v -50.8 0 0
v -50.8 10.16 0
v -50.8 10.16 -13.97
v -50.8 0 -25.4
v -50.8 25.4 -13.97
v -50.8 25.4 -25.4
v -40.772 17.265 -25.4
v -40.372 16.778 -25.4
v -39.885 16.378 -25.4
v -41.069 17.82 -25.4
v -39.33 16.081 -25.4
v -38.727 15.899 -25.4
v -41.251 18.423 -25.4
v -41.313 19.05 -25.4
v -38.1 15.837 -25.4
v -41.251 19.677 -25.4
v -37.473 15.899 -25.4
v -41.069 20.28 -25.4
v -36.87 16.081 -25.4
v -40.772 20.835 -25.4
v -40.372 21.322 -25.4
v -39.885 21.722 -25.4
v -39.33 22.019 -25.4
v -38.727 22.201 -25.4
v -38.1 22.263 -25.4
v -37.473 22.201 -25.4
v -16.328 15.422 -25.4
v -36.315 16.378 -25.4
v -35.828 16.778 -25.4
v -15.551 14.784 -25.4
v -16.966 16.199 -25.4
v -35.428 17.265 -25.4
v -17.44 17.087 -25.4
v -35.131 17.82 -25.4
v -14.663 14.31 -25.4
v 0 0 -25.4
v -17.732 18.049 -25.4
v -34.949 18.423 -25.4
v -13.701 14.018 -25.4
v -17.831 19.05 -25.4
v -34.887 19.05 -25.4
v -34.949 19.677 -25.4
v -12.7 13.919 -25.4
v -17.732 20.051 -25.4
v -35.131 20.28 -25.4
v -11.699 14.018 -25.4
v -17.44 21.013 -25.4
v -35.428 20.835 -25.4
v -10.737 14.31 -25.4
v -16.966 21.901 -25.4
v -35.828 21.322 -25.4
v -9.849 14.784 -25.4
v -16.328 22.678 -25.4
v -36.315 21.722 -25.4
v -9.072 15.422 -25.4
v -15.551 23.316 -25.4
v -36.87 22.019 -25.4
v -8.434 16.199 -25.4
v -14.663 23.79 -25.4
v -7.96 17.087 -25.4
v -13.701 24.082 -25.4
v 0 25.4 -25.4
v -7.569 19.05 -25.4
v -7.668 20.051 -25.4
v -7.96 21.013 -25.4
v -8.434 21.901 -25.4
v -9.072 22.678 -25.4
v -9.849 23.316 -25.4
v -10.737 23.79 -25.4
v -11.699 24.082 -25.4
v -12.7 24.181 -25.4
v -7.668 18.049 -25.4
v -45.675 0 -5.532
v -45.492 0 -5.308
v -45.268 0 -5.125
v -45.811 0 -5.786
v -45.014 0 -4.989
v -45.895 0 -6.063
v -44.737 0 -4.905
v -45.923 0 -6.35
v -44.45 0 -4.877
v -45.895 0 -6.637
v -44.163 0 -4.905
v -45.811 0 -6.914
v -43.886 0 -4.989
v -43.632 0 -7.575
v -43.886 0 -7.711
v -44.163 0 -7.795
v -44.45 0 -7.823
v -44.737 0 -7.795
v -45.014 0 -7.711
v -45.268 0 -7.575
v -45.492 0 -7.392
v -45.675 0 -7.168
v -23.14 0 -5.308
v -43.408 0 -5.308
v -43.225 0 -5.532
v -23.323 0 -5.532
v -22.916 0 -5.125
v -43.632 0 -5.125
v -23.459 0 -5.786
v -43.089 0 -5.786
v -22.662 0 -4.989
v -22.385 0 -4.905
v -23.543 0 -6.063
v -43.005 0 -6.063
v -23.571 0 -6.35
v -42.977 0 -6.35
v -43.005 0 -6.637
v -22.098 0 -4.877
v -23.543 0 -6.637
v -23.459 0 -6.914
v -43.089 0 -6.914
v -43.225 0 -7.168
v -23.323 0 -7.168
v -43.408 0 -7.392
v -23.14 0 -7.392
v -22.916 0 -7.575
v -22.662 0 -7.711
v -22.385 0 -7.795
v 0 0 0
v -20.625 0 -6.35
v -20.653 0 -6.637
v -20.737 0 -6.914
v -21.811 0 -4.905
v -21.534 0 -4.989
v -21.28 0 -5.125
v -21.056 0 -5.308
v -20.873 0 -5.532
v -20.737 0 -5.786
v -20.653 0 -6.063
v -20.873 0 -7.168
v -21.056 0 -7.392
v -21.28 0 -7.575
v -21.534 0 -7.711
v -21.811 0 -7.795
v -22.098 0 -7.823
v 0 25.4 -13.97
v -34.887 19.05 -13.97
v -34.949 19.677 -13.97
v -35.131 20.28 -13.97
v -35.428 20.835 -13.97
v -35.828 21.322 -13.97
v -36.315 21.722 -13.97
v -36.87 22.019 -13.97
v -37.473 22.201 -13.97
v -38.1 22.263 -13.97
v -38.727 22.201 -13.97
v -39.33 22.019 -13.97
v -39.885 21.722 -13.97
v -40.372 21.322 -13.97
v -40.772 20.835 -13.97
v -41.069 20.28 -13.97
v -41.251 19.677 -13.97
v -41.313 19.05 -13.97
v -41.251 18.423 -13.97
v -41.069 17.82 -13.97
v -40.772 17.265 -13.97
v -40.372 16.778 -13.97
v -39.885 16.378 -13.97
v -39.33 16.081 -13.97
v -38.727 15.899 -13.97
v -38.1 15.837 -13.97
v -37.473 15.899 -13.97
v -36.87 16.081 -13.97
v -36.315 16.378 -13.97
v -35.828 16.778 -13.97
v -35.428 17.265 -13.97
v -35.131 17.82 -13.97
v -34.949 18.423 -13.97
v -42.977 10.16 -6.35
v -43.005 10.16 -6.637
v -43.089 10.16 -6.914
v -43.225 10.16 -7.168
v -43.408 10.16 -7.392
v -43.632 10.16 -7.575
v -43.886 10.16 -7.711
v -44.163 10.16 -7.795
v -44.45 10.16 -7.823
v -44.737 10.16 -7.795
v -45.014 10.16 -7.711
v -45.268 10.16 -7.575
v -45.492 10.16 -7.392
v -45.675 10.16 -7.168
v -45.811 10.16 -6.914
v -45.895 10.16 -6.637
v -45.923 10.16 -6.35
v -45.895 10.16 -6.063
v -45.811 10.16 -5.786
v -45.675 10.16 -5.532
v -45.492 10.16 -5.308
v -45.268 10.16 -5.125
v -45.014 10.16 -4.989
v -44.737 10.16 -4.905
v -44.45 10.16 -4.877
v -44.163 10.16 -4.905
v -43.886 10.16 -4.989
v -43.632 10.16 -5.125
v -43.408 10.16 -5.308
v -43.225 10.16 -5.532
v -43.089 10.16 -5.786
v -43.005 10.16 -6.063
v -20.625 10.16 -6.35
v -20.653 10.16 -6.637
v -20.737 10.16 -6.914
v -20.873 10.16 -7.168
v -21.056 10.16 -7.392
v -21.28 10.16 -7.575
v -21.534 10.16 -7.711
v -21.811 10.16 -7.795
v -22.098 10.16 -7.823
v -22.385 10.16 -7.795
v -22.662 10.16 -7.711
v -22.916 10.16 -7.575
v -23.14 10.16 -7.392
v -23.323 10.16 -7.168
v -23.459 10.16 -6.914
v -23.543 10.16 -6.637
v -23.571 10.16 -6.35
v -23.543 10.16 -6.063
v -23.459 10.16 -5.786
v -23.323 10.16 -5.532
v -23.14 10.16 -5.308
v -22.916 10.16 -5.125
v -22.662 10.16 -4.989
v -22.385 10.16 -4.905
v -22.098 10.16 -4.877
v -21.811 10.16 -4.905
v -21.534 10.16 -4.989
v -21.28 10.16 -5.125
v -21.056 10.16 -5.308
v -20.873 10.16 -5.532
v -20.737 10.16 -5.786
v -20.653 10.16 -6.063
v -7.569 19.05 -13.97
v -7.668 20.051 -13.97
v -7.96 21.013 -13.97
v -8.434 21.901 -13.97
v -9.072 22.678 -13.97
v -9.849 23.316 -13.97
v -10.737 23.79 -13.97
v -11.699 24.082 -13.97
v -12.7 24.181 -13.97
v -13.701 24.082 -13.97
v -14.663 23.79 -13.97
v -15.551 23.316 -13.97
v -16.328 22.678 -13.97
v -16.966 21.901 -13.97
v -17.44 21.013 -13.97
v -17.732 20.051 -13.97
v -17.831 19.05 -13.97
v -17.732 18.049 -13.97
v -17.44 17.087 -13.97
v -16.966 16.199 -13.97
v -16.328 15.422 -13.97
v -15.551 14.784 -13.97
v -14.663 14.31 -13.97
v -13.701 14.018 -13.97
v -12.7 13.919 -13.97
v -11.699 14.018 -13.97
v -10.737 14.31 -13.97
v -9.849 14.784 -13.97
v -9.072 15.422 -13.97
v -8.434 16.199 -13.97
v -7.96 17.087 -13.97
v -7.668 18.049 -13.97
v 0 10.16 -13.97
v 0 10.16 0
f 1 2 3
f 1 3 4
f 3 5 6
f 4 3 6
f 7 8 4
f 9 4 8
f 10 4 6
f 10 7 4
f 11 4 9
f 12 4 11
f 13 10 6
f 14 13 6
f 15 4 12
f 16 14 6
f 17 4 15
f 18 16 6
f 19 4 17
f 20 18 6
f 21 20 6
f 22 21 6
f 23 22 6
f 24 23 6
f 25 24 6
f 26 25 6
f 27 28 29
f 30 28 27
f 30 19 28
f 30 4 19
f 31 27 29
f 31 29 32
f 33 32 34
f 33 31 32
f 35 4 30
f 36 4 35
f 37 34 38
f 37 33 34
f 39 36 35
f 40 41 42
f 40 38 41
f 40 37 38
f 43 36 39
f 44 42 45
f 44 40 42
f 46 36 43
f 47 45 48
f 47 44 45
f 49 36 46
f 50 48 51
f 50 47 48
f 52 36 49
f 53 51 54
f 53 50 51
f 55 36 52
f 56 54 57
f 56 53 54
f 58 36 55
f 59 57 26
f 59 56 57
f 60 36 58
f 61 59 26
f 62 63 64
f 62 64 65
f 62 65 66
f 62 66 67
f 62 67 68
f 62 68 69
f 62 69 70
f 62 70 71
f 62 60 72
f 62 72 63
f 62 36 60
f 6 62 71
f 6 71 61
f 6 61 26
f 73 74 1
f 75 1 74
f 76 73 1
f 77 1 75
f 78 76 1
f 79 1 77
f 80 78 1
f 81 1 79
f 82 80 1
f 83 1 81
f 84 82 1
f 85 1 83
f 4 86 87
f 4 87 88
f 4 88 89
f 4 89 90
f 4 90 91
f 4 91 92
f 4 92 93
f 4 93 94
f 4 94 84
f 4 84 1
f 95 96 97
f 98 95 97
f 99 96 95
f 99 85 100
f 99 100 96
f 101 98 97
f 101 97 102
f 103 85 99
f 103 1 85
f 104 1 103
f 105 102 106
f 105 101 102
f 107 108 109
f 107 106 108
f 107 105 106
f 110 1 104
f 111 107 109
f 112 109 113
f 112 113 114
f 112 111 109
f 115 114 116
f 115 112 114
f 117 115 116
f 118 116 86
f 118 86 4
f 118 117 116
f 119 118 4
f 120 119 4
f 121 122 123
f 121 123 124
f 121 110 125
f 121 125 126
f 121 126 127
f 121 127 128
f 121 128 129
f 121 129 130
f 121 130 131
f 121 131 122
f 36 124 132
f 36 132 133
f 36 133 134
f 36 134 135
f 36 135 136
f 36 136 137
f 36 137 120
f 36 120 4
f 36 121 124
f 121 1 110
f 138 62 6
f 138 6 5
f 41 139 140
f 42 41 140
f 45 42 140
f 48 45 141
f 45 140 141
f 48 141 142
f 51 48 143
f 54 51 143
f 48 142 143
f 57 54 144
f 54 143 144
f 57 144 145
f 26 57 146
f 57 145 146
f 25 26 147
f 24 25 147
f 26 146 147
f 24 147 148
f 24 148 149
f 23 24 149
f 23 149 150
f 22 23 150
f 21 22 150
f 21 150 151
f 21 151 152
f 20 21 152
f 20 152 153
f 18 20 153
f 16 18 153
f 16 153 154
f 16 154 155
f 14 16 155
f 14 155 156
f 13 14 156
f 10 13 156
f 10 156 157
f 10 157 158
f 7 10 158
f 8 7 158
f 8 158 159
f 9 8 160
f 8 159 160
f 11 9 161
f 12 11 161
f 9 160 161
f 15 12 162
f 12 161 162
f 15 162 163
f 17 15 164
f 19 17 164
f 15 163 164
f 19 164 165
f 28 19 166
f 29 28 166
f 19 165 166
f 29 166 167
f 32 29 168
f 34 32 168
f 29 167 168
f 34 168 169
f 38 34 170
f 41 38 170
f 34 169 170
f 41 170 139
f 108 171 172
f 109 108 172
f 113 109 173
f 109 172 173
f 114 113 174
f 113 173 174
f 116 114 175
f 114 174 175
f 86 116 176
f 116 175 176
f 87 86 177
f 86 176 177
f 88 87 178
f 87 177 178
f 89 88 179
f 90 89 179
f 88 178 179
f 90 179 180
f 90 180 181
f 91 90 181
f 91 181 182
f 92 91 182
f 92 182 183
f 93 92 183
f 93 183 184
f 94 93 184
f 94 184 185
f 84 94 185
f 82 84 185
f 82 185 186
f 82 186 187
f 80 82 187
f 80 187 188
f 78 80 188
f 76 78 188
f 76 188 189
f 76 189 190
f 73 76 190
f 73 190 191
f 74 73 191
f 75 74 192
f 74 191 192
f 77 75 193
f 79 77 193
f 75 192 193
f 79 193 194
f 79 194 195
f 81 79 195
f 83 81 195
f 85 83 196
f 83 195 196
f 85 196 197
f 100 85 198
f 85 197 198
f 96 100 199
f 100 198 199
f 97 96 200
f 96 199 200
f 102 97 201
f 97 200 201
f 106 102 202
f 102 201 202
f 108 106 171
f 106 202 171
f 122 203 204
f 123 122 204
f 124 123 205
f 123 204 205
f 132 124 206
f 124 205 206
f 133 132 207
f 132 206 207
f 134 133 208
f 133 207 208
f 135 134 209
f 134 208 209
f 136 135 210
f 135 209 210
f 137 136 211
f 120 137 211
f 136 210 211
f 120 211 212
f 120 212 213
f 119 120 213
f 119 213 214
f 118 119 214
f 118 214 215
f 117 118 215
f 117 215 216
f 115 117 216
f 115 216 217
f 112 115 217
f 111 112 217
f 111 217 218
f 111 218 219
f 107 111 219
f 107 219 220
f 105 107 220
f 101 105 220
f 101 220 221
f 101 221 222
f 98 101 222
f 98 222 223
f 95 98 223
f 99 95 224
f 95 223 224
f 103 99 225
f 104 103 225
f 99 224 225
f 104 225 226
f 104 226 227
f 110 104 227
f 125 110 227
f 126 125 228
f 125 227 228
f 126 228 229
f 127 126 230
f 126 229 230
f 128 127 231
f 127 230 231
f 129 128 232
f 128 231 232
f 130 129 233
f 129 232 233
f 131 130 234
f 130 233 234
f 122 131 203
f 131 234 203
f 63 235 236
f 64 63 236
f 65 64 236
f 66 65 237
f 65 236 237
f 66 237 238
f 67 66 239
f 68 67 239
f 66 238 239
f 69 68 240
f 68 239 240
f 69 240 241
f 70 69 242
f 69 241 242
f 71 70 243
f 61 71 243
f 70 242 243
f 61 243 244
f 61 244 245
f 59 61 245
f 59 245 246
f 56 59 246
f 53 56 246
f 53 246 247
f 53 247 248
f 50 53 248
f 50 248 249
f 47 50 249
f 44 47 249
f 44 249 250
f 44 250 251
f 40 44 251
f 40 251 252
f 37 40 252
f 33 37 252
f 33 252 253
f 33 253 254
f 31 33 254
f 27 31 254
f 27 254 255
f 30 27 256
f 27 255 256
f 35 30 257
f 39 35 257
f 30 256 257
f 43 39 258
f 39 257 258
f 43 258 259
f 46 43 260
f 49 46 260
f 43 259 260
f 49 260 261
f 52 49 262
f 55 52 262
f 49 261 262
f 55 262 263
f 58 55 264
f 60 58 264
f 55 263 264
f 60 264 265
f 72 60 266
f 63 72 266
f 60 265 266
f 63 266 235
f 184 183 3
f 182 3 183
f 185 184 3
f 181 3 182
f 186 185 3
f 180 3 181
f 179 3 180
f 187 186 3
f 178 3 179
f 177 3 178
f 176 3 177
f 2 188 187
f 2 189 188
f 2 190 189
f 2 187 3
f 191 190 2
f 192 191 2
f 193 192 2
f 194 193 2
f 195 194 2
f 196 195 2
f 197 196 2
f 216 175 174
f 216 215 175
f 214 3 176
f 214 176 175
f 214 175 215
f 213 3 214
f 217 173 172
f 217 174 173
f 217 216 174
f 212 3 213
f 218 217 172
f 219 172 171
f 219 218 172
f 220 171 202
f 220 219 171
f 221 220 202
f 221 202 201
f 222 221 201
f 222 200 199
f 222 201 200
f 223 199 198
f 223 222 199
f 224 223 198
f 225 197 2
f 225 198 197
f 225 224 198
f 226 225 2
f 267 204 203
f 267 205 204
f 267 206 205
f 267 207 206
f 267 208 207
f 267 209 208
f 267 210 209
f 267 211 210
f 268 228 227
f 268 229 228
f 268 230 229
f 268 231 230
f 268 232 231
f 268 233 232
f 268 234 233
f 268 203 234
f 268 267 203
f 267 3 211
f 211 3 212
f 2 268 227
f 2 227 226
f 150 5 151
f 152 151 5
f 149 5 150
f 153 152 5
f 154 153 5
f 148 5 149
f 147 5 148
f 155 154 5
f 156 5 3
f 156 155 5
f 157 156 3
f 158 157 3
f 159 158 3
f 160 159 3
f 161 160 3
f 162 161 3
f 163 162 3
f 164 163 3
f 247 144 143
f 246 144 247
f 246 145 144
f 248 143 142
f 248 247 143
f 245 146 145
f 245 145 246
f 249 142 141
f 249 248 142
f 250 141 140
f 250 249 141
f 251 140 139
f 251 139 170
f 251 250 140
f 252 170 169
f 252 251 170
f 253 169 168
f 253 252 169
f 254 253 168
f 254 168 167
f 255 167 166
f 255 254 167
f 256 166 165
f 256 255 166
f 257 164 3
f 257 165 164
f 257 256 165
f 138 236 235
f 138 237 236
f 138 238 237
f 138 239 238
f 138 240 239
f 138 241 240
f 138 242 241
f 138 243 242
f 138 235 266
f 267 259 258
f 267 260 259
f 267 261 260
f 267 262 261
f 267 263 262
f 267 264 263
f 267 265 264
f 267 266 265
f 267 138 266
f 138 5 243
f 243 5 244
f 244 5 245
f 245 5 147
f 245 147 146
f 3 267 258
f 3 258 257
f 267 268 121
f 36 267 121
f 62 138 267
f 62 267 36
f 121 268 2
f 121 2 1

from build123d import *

# Parameters (mm, degrees)
BOSS_EXTRUDE1_DEPTH = 50.8
SKETCH4_R           = 1.4732
CUT_EXTRUDE1_DEPTH  = 11.16
SKETCH5_R           = 3.2131
SKETCH5_R_2         = 5.1308
CUT_EXTRUDE2_DEPTH  = 50.8


with BuildPart() as part:
    # Sketch3 → Boss-Extrude1 (new body)
    with BuildSketch(Plane(origin=(0, 0, 0), x_dir=(0, 0, -1), z_dir=(1, 0, 0))):
        Polygon((0, 0), (25.4, 0), (25.4, 25.4), (13.97, 25.4), (13.97, 10.16), (0, 10.16), align=None)
    extrude(amount=-BOSS_EXTRUDE1_DEPTH)

    # Sketch4 → Cut-Extrude1 (cut, through all)
    with BuildSketch(Plane(origin=(0, 10.16, 0), x_dir=(1, 0, 0), z_dir=(0, 1, 0))):
        with Locations((-44.45, 6.35)):
            Circle(SKETCH4_R)
        with Locations((-22.098, 6.35)):
            Circle(SKETCH4_R)
    extrude(amount=-CUT_EXTRUDE1_DEPTH, mode=Mode.SUBTRACT)

    # Sketch5 → Cut-Extrude2 (cut)
    with BuildSketch(Plane.XY.offset(-13.97)):
        with Locations((-38.1, 19.05)):
            Circle(SKETCH5_R)
        with Locations((-12.7, 19.05)):
            Circle(SKETCH5_R_2)
    extrude(amount=-CUT_EXTRUDE2_DEPTH, mode=Mode.SUBTRACT)


solid = part.part
